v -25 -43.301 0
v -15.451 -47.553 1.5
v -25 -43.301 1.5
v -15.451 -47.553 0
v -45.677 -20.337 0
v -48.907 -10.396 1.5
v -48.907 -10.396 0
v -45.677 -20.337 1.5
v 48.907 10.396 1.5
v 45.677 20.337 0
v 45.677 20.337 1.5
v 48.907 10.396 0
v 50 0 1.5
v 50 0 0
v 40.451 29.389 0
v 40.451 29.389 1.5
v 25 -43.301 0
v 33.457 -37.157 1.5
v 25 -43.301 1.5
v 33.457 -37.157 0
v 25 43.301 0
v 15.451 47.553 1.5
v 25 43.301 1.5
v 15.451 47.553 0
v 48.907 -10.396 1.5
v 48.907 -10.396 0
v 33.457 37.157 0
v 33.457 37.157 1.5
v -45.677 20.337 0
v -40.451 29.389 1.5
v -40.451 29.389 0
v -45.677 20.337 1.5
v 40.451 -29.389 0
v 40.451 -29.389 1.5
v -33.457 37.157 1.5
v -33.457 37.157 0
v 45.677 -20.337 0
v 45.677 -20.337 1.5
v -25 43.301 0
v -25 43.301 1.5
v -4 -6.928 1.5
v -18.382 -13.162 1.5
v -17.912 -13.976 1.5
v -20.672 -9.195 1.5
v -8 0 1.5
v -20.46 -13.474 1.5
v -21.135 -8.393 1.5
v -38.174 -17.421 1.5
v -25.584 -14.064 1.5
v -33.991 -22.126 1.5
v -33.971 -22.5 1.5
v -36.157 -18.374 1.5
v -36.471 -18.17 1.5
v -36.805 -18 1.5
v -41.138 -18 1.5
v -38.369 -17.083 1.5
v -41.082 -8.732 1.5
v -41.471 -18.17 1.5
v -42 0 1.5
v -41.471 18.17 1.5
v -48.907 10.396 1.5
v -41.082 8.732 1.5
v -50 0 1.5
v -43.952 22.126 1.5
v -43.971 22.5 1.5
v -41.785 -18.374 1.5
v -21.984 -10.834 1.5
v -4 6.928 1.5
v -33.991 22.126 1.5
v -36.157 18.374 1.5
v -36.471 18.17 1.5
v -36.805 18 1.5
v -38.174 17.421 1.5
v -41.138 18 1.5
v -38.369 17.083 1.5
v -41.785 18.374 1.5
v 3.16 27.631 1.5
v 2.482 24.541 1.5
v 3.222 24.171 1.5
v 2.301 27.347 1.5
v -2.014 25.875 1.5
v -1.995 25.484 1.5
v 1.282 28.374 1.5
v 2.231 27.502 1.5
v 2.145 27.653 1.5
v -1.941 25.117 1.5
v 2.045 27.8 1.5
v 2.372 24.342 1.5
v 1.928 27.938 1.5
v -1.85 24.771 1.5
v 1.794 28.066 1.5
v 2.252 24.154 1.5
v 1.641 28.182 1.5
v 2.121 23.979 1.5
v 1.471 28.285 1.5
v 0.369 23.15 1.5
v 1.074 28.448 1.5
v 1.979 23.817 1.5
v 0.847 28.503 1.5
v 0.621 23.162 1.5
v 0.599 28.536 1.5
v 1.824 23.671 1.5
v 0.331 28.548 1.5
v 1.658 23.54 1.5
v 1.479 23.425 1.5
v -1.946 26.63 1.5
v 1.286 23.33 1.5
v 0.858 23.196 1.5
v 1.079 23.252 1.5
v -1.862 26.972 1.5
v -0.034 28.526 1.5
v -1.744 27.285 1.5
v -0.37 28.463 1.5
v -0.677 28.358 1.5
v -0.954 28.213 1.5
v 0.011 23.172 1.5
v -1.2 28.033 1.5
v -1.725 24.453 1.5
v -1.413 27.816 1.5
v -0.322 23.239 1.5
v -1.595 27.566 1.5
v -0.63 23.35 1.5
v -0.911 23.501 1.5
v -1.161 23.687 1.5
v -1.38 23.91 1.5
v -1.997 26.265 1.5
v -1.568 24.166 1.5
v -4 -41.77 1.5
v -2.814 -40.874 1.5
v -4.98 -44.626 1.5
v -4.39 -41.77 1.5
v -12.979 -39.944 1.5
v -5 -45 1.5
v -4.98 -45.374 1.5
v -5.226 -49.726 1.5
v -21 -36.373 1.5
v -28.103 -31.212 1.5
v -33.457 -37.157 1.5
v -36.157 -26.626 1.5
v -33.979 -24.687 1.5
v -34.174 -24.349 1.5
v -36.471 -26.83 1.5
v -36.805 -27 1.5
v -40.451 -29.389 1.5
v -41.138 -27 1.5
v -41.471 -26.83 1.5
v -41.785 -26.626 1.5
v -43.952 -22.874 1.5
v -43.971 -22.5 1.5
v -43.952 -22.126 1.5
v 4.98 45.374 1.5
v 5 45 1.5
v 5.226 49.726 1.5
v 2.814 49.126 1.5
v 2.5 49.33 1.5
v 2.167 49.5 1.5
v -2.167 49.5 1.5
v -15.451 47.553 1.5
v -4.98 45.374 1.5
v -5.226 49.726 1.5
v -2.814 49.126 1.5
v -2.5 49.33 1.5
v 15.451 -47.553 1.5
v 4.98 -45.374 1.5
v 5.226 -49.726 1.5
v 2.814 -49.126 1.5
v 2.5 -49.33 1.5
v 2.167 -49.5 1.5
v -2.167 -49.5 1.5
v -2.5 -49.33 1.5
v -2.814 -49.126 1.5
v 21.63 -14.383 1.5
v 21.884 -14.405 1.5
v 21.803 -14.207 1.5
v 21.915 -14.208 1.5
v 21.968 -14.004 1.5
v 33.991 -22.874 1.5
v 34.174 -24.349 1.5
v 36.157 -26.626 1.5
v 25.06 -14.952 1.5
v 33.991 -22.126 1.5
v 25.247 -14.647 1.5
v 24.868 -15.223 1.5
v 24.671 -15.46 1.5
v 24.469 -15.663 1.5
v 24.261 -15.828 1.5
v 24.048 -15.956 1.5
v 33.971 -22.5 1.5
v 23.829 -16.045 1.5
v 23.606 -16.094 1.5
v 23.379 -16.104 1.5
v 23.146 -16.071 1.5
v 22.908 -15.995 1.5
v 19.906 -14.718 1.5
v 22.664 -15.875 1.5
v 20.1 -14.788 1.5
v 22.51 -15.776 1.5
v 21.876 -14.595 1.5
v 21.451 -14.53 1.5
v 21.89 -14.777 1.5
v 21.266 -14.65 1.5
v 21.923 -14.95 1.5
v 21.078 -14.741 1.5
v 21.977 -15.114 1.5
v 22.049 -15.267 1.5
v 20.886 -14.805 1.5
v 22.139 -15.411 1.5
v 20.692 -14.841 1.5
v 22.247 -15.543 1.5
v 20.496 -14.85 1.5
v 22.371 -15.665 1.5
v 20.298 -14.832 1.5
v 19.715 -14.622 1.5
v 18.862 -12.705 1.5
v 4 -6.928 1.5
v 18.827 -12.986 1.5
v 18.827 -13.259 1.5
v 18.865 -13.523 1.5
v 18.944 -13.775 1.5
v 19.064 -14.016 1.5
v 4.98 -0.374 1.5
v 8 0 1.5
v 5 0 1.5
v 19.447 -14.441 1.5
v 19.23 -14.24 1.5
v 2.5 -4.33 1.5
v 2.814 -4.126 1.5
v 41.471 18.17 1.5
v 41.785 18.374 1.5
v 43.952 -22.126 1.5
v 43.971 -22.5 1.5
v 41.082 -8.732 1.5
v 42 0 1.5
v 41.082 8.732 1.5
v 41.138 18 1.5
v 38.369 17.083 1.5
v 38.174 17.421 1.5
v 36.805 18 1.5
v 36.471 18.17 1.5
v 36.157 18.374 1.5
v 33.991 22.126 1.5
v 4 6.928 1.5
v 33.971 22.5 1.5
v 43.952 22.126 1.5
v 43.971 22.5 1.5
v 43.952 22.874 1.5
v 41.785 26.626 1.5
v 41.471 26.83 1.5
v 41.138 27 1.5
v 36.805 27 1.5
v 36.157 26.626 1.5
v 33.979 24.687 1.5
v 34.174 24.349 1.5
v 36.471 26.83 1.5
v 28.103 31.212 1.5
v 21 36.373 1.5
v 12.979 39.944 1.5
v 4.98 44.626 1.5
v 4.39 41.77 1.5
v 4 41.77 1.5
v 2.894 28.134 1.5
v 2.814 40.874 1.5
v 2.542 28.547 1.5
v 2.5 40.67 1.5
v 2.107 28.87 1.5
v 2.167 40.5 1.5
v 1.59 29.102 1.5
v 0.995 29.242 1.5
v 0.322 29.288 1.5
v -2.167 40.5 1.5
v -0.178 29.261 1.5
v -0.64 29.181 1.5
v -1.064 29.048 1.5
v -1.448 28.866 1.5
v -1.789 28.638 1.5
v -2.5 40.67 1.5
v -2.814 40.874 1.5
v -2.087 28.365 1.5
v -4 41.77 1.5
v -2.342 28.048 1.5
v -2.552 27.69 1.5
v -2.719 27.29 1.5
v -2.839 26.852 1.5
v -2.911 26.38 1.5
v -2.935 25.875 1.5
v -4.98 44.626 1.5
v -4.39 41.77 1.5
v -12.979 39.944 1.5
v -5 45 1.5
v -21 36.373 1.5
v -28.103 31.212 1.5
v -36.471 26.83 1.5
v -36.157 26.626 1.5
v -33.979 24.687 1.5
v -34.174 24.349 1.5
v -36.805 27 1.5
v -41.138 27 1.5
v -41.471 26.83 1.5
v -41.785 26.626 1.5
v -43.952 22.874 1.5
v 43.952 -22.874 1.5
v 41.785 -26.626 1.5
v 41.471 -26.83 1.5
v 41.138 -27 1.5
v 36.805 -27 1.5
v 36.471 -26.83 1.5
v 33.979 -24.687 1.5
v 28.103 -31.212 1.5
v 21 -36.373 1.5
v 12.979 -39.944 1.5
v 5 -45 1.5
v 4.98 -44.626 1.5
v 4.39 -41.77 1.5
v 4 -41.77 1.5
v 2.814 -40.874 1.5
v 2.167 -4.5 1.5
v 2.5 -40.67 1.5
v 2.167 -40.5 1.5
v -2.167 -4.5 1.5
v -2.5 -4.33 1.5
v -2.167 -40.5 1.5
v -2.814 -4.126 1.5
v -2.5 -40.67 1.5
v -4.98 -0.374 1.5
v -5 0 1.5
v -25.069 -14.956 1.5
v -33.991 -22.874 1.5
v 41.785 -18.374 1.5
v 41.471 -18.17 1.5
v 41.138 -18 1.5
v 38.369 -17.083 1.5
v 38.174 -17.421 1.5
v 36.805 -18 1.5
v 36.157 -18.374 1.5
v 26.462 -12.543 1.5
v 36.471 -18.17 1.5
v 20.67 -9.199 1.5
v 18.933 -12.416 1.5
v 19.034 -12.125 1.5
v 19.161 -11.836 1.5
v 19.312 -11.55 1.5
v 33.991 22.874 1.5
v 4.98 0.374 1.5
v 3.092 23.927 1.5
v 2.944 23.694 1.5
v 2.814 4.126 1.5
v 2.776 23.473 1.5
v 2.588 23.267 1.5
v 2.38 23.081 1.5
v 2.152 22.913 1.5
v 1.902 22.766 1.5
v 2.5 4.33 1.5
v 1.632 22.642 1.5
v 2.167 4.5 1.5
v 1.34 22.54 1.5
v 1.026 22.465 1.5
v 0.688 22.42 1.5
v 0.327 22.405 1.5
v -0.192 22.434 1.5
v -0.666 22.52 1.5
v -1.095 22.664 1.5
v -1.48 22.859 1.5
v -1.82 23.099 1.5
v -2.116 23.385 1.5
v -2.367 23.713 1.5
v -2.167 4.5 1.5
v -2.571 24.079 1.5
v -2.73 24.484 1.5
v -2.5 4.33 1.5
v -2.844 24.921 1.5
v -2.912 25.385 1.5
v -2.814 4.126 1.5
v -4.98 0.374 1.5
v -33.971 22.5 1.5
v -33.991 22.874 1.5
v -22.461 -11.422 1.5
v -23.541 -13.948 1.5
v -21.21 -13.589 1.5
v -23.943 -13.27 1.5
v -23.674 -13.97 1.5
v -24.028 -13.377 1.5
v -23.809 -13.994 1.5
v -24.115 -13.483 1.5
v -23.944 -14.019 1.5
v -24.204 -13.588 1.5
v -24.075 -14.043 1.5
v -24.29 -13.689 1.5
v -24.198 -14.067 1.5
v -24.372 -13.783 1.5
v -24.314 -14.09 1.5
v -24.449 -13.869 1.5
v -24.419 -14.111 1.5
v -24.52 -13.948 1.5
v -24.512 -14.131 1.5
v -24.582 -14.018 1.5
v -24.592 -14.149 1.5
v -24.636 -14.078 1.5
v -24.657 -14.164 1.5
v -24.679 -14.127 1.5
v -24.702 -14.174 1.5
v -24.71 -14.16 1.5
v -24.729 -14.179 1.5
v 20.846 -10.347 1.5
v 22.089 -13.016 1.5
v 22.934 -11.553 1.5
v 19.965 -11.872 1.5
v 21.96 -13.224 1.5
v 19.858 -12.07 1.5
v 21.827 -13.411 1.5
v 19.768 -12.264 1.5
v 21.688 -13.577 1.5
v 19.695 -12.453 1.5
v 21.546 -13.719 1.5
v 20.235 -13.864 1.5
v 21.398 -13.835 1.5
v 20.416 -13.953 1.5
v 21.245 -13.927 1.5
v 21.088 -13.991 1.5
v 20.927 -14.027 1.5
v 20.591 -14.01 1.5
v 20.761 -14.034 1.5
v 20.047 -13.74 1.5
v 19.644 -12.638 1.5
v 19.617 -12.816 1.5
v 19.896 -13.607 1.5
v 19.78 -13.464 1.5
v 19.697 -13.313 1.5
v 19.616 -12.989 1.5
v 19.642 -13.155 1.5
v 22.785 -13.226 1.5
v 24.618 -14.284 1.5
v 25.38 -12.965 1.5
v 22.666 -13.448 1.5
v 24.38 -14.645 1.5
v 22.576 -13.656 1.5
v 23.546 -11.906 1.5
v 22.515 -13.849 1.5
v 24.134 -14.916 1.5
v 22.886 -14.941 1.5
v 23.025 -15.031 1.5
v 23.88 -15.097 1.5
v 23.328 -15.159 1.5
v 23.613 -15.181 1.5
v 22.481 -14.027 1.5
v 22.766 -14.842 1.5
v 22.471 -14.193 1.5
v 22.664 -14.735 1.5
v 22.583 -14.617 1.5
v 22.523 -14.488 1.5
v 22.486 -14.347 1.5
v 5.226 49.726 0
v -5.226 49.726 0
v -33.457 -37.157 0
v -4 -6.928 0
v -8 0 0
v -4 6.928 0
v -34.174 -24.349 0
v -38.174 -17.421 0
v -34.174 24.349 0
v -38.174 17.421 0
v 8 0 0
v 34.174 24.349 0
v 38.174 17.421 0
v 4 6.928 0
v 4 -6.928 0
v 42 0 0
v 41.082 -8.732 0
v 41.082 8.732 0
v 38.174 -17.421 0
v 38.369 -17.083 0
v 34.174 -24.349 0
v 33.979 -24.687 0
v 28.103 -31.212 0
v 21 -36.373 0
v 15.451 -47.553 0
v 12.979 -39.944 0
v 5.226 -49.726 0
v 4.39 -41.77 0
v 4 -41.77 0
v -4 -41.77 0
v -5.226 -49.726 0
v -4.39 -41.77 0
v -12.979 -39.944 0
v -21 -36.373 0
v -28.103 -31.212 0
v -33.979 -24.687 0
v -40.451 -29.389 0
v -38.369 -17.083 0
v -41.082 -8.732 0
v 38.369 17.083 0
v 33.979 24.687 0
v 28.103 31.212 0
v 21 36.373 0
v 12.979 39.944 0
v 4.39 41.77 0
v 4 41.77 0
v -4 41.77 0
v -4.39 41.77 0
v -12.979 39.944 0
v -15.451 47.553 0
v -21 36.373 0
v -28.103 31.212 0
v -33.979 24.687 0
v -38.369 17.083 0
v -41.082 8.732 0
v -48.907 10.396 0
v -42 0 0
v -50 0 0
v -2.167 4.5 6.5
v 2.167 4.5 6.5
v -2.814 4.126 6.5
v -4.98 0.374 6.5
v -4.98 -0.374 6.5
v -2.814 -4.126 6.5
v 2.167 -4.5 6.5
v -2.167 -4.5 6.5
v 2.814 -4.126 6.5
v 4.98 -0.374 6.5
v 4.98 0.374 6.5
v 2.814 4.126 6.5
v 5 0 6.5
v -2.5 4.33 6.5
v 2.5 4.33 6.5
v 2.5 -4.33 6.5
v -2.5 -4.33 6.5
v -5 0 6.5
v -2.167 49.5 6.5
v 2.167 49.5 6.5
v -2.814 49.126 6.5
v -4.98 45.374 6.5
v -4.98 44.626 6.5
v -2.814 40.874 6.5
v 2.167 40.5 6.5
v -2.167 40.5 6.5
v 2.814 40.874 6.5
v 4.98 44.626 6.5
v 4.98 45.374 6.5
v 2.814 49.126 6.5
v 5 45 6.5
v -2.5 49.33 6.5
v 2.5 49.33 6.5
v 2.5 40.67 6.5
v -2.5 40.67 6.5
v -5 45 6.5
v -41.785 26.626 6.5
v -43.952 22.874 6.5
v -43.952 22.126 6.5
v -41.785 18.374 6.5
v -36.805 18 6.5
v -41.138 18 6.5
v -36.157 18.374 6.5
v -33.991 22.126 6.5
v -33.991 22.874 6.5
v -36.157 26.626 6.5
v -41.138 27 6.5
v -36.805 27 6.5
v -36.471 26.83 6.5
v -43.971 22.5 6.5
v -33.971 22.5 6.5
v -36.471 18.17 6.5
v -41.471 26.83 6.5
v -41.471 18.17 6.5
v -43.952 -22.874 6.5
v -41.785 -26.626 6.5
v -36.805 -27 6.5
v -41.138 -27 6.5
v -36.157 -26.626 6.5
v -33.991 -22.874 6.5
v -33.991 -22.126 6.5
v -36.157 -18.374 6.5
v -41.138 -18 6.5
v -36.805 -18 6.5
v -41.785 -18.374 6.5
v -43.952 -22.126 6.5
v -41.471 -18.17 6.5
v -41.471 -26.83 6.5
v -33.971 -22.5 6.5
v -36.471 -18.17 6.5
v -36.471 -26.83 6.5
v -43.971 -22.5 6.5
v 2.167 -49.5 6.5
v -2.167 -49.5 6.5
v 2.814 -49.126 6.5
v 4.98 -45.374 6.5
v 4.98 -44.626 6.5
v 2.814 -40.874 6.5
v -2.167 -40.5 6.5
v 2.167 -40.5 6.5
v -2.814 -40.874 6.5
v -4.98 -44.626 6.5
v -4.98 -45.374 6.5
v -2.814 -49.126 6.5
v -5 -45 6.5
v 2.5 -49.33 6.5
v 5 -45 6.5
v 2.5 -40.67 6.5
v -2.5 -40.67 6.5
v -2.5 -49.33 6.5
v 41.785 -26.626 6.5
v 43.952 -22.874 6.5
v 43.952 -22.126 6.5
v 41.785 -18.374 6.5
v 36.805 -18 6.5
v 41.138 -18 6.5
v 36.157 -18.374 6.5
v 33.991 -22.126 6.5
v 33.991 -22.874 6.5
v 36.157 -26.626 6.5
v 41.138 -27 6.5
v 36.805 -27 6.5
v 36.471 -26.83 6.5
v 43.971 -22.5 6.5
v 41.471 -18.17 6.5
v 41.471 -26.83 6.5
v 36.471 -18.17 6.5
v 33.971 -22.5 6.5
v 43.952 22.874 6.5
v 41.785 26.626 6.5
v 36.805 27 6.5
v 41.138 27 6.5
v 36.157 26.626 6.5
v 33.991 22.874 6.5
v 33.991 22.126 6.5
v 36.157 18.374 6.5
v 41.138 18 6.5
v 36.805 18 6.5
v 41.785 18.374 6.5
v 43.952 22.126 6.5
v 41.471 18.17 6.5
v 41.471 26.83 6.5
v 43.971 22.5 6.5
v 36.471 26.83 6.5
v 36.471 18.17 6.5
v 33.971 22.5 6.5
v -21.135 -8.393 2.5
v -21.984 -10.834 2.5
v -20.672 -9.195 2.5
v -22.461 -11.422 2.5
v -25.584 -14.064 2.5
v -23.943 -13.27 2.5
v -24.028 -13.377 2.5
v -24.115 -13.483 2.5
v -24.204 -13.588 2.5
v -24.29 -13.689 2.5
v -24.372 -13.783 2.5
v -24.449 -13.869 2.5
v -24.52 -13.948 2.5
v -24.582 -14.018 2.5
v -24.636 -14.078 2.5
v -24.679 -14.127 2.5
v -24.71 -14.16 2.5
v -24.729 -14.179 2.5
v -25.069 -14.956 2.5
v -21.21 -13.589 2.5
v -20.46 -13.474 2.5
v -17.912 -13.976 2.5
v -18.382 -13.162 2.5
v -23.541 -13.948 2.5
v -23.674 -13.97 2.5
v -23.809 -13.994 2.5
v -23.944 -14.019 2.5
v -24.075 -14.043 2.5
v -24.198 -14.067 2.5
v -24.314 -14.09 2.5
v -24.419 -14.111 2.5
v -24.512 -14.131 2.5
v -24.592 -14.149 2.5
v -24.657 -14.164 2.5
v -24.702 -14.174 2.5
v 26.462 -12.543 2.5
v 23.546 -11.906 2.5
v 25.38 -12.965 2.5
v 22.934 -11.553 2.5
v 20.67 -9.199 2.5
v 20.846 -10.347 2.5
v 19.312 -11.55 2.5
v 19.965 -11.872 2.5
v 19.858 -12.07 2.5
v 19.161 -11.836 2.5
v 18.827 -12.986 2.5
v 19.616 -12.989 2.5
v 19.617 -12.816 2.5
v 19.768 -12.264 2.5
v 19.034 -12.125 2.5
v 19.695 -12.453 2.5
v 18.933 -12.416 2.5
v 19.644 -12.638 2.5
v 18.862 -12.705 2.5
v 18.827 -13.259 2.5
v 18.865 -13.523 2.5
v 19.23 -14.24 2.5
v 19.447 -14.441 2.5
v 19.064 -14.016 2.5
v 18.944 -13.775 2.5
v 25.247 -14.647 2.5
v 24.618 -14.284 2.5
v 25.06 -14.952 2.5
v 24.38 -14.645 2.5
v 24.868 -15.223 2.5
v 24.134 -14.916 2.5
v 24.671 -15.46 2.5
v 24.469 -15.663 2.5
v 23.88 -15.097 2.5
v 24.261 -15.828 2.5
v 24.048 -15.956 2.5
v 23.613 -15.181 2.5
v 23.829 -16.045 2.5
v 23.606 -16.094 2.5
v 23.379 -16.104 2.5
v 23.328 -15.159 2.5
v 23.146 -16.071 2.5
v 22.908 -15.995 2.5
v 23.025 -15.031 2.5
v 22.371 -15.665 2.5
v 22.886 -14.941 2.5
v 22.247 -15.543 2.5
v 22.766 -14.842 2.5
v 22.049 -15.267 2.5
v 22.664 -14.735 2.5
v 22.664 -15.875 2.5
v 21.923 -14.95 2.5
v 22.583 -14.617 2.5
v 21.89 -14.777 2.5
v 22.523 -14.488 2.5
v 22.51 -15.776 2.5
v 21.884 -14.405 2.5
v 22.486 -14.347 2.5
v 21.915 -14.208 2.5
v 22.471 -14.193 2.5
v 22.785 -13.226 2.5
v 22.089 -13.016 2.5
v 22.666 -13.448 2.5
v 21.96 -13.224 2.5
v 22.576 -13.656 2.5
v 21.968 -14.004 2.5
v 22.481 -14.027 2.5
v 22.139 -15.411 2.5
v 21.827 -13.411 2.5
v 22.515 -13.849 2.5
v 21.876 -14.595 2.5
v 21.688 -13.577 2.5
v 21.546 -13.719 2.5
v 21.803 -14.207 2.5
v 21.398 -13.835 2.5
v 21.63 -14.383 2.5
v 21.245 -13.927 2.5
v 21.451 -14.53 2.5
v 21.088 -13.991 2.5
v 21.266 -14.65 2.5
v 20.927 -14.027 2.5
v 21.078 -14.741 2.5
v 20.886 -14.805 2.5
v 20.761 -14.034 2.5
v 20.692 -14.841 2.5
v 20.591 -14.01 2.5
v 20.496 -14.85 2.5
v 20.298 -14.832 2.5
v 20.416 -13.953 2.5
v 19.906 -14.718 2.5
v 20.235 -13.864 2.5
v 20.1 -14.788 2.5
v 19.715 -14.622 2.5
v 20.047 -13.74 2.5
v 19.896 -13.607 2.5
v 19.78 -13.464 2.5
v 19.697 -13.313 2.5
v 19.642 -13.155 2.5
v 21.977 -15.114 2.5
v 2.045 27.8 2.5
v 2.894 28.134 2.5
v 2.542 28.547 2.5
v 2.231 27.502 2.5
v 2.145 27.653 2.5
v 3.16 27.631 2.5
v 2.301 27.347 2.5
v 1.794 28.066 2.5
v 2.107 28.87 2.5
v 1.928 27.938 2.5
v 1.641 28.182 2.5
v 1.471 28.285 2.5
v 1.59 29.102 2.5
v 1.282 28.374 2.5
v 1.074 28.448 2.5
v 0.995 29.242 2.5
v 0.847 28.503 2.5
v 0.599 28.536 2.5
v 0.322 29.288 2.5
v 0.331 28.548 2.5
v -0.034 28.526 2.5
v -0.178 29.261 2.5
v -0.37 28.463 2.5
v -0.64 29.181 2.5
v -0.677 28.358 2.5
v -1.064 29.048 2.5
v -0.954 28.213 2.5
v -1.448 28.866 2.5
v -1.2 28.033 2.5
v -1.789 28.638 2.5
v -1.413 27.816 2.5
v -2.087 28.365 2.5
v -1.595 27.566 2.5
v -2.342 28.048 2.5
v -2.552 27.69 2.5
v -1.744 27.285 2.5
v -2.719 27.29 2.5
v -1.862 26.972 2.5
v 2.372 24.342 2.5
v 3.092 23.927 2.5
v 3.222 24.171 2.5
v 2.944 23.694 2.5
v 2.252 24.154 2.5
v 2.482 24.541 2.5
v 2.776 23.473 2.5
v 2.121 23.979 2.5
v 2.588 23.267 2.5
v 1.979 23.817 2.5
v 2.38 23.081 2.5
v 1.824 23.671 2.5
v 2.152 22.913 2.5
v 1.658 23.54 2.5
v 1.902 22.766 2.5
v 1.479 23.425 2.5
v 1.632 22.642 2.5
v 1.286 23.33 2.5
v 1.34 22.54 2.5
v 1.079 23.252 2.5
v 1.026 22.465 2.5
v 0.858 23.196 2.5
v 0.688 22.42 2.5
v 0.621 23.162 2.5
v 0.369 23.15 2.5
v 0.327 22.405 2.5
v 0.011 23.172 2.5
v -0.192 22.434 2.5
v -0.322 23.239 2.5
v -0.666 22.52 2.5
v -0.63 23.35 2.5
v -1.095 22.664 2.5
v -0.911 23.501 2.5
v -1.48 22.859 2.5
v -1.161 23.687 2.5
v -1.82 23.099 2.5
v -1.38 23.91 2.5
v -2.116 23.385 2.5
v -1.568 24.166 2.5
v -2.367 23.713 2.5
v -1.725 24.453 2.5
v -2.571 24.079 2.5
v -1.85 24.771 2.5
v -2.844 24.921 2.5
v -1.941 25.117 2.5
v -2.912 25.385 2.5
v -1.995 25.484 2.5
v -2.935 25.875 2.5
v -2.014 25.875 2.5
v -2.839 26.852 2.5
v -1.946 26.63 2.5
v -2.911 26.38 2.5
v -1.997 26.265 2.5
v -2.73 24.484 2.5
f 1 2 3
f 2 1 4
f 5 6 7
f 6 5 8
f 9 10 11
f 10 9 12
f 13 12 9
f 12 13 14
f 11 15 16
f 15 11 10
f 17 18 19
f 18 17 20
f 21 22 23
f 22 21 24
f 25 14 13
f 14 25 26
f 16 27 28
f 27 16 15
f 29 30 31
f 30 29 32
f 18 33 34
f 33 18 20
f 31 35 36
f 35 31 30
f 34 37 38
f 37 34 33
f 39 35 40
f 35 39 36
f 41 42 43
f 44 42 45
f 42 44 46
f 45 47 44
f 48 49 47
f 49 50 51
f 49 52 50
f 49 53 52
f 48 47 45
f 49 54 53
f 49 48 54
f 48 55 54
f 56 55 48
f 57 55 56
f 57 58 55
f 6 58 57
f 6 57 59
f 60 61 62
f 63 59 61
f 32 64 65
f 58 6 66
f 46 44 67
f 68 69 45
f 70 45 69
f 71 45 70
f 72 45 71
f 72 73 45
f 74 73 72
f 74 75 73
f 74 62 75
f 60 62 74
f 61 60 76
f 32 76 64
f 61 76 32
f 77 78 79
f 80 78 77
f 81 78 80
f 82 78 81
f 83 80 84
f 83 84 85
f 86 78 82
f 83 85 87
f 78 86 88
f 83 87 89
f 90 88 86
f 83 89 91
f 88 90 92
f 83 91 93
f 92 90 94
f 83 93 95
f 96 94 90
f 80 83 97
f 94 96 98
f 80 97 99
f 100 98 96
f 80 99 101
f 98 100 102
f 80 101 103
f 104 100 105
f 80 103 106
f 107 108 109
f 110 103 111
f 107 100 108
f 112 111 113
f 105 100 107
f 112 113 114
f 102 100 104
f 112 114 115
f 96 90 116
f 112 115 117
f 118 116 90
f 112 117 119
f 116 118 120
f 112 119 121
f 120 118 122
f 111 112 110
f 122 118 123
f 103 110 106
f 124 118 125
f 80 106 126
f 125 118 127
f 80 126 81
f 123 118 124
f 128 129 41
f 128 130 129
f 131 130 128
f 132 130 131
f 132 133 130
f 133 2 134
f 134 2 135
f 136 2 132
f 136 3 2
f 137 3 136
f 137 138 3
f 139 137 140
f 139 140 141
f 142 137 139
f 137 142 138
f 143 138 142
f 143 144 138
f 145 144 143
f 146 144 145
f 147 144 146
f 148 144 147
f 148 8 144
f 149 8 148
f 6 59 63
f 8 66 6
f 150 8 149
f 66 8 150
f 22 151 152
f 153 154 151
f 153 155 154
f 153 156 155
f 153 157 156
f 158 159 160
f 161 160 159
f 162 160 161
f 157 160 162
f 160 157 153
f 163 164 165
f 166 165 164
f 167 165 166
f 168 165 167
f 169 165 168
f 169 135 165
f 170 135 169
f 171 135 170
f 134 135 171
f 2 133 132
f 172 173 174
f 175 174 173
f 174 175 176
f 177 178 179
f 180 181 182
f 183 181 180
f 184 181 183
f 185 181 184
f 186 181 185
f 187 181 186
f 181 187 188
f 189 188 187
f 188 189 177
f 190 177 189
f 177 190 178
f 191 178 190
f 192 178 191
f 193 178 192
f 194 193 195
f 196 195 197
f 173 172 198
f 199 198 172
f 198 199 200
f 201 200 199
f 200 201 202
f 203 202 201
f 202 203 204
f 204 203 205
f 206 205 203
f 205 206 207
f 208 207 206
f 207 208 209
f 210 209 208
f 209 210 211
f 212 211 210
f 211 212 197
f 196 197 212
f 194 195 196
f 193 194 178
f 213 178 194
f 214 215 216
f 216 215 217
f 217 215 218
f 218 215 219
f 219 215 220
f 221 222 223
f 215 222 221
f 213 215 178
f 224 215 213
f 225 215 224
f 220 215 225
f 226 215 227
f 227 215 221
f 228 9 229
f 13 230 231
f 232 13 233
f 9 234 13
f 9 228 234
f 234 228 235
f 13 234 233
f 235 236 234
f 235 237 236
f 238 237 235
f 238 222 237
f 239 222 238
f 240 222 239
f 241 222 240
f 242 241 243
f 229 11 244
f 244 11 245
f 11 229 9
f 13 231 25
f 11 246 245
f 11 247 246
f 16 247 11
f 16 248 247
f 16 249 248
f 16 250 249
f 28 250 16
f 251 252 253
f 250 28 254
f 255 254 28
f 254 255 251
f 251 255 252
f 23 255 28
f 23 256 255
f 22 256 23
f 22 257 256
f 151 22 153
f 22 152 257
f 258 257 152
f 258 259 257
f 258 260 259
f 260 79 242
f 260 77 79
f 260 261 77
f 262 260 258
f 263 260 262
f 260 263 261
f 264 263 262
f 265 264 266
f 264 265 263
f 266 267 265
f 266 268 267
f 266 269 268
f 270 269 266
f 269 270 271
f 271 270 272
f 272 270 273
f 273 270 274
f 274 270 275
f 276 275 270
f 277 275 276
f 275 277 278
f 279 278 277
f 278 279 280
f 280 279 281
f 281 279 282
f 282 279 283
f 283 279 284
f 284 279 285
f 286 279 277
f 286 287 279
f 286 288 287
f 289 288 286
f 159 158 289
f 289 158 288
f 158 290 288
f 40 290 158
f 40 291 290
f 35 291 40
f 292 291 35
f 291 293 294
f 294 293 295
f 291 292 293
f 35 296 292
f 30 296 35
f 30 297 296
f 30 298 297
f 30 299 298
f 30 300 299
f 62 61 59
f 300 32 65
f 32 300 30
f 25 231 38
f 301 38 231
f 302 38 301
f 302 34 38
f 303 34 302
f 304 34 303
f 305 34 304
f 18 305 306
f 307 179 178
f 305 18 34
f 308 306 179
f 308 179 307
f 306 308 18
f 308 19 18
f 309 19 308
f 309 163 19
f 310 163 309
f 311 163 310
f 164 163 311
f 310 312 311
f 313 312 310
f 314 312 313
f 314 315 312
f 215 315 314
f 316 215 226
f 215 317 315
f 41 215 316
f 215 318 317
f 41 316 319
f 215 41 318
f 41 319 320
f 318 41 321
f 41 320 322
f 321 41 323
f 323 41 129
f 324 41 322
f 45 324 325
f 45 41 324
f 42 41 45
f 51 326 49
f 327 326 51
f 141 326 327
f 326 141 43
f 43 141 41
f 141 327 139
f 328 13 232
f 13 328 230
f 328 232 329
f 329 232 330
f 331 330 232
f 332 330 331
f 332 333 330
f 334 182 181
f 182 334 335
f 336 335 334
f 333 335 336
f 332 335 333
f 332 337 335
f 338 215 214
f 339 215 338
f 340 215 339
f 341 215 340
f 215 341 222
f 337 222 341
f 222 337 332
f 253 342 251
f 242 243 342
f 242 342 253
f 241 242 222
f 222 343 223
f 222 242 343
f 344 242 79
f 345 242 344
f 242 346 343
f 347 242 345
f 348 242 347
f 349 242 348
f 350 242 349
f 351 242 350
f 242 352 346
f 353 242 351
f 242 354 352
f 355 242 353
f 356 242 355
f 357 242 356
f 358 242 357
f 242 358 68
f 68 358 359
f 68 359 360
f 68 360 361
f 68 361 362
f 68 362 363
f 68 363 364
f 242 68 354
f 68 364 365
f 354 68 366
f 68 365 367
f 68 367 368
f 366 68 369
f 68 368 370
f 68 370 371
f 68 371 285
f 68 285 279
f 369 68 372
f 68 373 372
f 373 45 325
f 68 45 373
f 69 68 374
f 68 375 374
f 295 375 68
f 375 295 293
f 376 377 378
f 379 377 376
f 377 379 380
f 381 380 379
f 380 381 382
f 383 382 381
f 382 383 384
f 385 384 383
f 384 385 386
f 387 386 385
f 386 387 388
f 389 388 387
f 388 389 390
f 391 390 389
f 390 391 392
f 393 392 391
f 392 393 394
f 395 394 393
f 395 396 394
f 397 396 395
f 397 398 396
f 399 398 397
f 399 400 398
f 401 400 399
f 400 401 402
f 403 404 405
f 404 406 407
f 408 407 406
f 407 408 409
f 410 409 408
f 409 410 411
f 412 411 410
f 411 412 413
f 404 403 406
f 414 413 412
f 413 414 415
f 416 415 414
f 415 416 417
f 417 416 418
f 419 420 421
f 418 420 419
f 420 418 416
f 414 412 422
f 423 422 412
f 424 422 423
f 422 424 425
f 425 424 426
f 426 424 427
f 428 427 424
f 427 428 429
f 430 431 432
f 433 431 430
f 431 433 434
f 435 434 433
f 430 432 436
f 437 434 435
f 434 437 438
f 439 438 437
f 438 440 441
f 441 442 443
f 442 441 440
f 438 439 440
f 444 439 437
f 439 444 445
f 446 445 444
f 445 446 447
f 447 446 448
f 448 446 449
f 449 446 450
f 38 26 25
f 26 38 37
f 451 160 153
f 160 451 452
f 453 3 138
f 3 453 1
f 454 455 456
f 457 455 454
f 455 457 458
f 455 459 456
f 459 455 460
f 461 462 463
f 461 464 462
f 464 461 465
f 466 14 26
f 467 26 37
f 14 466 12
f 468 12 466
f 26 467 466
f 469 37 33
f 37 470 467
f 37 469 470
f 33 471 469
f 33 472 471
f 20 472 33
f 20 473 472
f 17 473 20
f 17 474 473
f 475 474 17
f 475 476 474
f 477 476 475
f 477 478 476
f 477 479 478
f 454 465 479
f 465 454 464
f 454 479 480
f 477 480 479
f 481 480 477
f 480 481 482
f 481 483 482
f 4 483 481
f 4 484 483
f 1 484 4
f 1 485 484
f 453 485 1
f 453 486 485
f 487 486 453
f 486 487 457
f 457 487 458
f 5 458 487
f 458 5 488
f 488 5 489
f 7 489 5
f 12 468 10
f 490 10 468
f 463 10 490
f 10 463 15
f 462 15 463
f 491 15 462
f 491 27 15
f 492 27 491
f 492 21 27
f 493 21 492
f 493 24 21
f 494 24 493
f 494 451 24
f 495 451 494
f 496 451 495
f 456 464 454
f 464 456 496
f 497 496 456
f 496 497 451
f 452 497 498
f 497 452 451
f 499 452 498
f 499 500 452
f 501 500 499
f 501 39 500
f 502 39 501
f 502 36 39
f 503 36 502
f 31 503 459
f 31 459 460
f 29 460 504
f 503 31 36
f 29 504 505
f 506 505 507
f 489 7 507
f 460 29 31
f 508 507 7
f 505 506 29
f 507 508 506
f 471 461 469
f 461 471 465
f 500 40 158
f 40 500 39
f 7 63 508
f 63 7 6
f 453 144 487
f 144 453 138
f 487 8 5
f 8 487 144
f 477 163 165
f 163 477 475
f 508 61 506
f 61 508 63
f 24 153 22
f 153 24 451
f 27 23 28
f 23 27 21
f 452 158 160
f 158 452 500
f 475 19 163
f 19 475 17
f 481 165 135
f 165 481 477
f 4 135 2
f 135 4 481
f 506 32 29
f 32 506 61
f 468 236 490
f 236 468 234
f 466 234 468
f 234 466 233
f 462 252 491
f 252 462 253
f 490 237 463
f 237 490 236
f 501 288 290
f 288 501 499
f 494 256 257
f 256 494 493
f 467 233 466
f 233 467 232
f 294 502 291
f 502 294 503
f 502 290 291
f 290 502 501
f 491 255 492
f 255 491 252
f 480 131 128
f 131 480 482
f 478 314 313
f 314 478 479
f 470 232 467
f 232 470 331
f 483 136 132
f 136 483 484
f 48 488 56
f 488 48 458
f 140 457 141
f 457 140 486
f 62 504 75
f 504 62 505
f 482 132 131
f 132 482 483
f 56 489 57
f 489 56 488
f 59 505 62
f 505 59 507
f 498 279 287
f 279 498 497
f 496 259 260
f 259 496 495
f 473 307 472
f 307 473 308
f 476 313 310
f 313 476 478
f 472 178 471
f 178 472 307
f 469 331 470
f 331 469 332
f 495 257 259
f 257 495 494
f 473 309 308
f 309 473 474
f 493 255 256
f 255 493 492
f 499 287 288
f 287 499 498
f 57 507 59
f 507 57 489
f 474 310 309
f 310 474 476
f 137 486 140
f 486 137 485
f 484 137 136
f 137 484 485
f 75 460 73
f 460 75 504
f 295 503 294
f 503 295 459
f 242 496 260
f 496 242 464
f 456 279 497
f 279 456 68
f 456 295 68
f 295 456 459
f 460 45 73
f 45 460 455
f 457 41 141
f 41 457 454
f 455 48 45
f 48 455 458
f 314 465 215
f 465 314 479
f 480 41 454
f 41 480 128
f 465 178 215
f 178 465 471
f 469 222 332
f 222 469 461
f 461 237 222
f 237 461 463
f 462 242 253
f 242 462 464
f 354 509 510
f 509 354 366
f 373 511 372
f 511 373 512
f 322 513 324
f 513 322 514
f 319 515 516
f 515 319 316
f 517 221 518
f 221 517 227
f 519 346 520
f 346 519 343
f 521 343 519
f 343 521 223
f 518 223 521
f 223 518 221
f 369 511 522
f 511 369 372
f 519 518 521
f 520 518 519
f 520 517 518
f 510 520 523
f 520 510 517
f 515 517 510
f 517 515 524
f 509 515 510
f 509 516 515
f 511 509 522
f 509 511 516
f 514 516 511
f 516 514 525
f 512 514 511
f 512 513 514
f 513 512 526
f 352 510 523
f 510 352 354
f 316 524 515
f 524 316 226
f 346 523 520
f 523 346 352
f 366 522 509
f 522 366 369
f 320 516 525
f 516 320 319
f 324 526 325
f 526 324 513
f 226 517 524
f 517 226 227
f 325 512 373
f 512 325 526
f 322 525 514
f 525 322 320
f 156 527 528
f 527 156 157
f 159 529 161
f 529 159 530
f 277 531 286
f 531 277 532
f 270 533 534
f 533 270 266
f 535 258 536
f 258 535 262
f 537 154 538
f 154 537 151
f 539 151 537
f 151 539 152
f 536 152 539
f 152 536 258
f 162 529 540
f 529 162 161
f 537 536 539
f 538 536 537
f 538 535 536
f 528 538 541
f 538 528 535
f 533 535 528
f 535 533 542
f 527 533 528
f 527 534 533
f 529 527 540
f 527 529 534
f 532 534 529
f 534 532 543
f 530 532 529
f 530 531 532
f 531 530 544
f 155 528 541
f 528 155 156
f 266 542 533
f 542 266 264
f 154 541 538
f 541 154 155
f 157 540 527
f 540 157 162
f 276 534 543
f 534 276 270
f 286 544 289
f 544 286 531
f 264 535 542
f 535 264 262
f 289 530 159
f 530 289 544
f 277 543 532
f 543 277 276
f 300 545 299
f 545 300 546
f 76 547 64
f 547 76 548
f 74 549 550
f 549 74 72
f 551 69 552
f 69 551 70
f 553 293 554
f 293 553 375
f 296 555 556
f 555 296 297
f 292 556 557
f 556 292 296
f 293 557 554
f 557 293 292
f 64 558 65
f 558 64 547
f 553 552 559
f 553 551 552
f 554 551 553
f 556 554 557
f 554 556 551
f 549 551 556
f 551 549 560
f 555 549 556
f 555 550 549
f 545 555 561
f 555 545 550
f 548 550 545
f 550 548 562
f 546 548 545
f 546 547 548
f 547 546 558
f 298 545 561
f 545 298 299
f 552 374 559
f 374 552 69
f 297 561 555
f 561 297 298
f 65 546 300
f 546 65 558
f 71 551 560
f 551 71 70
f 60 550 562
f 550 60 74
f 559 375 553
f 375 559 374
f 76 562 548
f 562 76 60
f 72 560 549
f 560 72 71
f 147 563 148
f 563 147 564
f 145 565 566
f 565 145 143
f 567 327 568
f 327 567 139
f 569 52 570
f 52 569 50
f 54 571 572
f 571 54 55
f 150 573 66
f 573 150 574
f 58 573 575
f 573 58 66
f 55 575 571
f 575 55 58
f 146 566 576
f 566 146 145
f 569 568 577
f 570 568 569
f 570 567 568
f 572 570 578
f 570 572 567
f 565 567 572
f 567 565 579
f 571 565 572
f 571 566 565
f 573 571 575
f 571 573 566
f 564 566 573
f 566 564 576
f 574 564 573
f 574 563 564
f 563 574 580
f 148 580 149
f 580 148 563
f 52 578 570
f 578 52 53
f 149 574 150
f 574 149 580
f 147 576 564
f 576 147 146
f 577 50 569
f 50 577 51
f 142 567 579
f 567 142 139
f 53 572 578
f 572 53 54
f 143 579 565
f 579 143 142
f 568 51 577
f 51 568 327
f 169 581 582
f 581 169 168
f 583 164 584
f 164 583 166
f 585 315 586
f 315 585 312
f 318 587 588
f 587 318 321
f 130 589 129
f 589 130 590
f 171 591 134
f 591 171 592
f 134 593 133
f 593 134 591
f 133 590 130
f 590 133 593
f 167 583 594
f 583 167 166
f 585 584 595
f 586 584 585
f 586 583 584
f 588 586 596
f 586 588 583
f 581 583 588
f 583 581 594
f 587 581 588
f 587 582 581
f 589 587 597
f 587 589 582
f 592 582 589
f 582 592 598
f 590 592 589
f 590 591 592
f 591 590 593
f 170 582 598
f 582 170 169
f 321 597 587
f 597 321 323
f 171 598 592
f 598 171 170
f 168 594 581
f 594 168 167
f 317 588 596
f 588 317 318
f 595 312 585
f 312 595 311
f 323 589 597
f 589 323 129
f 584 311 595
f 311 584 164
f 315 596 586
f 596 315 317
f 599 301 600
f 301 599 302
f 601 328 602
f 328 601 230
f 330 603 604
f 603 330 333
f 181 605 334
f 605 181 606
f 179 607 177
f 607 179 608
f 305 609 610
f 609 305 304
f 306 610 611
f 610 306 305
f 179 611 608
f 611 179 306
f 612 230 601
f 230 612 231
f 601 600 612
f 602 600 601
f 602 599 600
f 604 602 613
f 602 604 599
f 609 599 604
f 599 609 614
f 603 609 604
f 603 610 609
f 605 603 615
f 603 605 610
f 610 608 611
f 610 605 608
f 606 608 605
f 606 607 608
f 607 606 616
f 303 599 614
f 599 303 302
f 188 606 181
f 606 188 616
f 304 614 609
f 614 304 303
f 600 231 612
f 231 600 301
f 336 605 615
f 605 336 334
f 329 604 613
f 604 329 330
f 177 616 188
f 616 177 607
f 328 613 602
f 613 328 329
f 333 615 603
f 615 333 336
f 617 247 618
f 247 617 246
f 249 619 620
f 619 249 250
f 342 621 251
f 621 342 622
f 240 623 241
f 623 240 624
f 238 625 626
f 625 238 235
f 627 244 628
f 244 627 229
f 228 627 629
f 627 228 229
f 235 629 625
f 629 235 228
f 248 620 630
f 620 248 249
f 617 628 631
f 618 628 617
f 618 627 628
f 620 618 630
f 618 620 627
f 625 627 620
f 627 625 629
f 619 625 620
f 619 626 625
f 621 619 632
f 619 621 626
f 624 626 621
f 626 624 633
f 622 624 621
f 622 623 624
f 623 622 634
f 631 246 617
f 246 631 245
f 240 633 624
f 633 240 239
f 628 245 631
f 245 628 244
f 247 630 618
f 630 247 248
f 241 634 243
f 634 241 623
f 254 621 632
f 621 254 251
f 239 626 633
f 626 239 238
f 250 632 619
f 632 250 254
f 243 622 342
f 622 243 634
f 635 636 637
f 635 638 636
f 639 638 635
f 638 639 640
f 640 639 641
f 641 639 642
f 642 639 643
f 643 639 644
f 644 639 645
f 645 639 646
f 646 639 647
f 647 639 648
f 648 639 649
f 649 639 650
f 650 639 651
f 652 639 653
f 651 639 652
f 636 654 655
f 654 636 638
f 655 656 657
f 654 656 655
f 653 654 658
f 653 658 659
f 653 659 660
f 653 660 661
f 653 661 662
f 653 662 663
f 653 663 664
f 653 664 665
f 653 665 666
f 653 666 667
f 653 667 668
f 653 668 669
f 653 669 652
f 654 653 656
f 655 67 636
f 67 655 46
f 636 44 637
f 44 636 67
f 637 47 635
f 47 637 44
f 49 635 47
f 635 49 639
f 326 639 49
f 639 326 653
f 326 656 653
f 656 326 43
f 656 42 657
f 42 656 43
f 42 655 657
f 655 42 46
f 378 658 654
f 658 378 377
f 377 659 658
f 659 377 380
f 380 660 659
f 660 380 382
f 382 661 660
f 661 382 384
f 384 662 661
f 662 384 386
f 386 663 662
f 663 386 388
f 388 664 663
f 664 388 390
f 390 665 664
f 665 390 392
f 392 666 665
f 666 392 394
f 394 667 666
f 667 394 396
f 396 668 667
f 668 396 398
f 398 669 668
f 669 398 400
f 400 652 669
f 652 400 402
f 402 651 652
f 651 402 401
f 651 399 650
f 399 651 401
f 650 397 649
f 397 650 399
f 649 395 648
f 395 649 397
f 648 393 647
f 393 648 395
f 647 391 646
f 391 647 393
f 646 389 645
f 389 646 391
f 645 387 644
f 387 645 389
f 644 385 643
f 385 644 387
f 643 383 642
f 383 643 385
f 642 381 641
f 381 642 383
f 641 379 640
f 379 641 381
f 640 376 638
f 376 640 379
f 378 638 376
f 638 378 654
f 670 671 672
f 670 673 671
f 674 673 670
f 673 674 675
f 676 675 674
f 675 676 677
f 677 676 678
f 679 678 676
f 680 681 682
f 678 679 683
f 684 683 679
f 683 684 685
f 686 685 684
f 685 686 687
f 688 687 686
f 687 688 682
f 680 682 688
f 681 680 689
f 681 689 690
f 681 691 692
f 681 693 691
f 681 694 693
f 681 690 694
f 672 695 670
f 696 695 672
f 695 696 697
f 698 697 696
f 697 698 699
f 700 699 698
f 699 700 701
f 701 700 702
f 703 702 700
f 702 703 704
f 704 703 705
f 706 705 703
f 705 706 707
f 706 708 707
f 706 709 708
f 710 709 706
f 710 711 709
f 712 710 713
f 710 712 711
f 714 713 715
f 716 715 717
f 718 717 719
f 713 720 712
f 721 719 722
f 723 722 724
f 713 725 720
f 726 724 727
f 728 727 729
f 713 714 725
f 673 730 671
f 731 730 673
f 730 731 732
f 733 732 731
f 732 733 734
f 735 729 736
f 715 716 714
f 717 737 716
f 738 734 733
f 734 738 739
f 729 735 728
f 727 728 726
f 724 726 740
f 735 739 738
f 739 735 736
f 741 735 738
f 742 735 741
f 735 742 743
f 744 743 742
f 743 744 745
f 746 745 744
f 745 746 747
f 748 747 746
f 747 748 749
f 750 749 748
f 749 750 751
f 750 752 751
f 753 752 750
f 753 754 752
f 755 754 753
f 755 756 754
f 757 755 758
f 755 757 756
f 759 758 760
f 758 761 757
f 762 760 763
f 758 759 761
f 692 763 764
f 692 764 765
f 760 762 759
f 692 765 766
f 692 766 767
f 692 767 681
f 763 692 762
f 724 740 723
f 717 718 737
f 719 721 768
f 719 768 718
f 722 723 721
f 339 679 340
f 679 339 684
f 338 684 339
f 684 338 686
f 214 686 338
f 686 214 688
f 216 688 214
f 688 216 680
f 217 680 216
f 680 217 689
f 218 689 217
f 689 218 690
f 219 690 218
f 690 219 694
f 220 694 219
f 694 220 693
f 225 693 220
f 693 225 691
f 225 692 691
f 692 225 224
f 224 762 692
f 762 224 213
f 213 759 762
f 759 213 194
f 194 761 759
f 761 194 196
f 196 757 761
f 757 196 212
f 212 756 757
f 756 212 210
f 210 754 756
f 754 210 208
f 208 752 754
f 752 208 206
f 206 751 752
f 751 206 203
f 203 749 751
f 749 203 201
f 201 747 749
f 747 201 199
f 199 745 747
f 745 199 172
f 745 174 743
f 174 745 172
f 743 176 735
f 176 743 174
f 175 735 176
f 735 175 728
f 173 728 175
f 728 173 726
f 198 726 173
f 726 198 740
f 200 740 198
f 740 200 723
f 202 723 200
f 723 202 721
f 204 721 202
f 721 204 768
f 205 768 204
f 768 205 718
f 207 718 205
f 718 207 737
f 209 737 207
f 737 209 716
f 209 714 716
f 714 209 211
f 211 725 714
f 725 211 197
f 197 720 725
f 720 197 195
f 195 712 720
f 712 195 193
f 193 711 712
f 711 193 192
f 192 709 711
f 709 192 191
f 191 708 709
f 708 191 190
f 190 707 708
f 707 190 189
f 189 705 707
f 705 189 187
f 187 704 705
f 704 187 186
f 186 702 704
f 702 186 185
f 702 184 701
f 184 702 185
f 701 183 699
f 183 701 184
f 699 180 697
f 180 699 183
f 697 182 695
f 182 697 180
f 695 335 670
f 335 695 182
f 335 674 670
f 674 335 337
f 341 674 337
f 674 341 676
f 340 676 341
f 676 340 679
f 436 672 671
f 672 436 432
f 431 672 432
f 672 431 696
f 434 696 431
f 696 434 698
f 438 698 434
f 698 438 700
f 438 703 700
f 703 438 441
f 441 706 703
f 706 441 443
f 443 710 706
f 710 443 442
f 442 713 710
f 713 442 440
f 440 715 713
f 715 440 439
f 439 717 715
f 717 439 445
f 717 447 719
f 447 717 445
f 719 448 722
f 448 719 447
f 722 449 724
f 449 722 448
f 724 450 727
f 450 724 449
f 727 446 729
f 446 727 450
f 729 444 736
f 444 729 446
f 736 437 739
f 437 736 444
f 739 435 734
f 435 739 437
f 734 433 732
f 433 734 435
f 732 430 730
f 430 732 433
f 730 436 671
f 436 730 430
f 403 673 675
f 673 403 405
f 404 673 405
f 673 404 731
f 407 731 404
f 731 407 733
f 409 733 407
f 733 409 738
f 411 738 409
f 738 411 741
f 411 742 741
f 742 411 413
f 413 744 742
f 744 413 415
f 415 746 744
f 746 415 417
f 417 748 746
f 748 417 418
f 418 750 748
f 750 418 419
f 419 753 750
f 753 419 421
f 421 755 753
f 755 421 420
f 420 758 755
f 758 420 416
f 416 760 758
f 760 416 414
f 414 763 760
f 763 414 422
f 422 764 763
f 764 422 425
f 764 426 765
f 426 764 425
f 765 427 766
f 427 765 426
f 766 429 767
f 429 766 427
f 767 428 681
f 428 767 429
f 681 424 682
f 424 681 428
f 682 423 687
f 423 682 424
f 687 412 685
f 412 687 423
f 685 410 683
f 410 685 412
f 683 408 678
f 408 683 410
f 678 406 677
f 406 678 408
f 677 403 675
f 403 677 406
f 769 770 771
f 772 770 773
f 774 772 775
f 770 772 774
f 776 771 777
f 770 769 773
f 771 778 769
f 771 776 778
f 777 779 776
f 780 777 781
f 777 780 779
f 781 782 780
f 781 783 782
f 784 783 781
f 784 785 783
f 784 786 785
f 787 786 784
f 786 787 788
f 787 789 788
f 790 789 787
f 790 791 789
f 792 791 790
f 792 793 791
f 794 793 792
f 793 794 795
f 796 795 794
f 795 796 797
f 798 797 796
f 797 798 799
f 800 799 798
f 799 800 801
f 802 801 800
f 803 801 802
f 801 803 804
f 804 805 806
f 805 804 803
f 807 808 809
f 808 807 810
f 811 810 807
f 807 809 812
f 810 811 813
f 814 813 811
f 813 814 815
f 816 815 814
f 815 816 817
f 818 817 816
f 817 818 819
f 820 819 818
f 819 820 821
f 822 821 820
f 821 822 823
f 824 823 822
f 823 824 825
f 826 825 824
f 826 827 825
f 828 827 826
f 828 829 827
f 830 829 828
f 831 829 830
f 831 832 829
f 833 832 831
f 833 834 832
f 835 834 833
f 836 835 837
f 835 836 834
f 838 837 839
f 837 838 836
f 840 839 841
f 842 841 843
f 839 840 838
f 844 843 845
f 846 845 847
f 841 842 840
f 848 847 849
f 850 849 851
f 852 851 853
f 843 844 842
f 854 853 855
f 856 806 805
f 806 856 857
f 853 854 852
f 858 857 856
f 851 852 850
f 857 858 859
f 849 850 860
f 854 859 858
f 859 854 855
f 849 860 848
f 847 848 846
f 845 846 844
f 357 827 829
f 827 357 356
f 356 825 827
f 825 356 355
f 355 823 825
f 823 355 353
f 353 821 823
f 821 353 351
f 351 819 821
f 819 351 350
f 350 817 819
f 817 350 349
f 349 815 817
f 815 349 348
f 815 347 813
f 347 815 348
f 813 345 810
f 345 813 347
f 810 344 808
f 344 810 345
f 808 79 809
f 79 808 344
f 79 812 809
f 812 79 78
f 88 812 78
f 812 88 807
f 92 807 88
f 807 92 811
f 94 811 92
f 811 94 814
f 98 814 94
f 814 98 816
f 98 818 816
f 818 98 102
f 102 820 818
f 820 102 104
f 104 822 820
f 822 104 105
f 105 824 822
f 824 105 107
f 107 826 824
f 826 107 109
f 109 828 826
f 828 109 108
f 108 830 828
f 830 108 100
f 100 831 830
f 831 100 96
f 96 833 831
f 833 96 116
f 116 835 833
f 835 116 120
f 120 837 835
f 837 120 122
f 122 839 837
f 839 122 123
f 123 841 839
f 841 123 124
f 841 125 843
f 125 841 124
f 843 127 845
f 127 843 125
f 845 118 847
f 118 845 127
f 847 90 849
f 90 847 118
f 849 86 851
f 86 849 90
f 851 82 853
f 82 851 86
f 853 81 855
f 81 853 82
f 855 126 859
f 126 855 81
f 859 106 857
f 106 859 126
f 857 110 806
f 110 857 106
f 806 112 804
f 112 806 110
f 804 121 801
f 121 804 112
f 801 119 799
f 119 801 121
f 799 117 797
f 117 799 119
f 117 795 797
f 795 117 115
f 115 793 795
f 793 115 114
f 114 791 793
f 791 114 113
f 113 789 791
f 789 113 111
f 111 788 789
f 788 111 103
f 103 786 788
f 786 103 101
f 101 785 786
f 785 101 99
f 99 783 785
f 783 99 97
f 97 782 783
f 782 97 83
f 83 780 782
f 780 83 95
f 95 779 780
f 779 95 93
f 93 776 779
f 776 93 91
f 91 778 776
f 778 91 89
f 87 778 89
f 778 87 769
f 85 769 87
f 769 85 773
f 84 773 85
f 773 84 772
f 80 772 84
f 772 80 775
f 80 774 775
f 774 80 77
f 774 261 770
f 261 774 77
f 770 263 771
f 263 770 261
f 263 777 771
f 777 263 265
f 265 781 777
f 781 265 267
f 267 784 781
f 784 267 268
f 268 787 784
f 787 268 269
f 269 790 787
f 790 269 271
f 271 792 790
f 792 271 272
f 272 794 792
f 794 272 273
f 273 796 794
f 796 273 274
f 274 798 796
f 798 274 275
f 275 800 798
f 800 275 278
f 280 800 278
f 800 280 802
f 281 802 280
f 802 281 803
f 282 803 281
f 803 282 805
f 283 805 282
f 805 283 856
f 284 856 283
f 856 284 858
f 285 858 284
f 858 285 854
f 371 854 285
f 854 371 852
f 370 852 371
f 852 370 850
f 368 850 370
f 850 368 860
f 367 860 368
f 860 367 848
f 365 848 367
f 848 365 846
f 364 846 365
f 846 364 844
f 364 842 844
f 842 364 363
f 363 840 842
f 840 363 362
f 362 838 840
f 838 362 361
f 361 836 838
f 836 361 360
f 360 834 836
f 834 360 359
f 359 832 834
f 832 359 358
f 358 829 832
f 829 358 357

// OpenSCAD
// Calibration object for delta sizing
//
// Generate STL using OpenSCAD:
//   openscad calibrate_size.scad -o calibrate_size.stl

base_radius = 50;
base_height = 1.5;
base_width = 8;
cylinder_height = 5;
cylinder_radius = 5;
cylinder_outer_dist = 45;
ridge_cut_radius = .5;
text_height = 1;
text_size = 7;
spoke_angles = [0, 60, 120, 180, 240, 300];
CUT=0.01;

// Circular ring around entire object (to help reduce warping)
module base_ring() {
    difference() {
        cylinder(h=base_height, r=base_radius);
        translate([0, 0, -CUT])
            cylinder(h=base_height + 2*CUT, r=base_radius-base_width);
    }
}

// The base ring plus the base spokes
module base() {
    base_ring();
    // Spokes
    for (angle=spoke_angles)
        rotate([0, 0, angle])
            translate([-base_width/2, -CUT, 0])
                cube([base_width, base_radius-base_width+2*CUT, base_height]);
}

// Cylinder that measurement ridges are cut out of
module measuring_cylinder() {
    cut_width = cylinder_radius;
    difference() {
        cylinder(h=cylinder_height+CUT, r=cylinder_radius, $fn=60);
        for (angle=spoke_angles)
            rotate([0, 0, angle])
                translate([-cut_width, cylinder_radius - ridge_cut_radius, -CUT])
                    cube([2*cut_width, cut_width, cylinder_height+3*CUT]);
    }
}

// All the measuring cylinders around the ring
module measuring_cylinders() {
    measuring_cylinder();
    for (angle=spoke_angles)
        rotate([0, 0, angle])
            translate([0, cylinder_outer_dist, 0])
                measuring_cylinder();
}

// Text writing
module write_text(angle, dist, msg) {
    text_offset = dist + 1 - text_size/2;
    rotate([0, 0, angle])
        translate([0, text_offset, base_height - CUT])
            linear_extrude(height=text_height + CUT)
                text(msg, size=text_size, halign="center");
}

// Final object with text descriptions
module calibration_object() {
    base();
    translate([0, 0, base_height-CUT])
        measuring_cylinders();
    write_text(120, cylinder_outer_dist - 20, "A");
    write_text(240, cylinder_outer_dist - 20, "B");
    write_text(0, cylinder_outer_dist - 20, "C");
}

calibration_object();
